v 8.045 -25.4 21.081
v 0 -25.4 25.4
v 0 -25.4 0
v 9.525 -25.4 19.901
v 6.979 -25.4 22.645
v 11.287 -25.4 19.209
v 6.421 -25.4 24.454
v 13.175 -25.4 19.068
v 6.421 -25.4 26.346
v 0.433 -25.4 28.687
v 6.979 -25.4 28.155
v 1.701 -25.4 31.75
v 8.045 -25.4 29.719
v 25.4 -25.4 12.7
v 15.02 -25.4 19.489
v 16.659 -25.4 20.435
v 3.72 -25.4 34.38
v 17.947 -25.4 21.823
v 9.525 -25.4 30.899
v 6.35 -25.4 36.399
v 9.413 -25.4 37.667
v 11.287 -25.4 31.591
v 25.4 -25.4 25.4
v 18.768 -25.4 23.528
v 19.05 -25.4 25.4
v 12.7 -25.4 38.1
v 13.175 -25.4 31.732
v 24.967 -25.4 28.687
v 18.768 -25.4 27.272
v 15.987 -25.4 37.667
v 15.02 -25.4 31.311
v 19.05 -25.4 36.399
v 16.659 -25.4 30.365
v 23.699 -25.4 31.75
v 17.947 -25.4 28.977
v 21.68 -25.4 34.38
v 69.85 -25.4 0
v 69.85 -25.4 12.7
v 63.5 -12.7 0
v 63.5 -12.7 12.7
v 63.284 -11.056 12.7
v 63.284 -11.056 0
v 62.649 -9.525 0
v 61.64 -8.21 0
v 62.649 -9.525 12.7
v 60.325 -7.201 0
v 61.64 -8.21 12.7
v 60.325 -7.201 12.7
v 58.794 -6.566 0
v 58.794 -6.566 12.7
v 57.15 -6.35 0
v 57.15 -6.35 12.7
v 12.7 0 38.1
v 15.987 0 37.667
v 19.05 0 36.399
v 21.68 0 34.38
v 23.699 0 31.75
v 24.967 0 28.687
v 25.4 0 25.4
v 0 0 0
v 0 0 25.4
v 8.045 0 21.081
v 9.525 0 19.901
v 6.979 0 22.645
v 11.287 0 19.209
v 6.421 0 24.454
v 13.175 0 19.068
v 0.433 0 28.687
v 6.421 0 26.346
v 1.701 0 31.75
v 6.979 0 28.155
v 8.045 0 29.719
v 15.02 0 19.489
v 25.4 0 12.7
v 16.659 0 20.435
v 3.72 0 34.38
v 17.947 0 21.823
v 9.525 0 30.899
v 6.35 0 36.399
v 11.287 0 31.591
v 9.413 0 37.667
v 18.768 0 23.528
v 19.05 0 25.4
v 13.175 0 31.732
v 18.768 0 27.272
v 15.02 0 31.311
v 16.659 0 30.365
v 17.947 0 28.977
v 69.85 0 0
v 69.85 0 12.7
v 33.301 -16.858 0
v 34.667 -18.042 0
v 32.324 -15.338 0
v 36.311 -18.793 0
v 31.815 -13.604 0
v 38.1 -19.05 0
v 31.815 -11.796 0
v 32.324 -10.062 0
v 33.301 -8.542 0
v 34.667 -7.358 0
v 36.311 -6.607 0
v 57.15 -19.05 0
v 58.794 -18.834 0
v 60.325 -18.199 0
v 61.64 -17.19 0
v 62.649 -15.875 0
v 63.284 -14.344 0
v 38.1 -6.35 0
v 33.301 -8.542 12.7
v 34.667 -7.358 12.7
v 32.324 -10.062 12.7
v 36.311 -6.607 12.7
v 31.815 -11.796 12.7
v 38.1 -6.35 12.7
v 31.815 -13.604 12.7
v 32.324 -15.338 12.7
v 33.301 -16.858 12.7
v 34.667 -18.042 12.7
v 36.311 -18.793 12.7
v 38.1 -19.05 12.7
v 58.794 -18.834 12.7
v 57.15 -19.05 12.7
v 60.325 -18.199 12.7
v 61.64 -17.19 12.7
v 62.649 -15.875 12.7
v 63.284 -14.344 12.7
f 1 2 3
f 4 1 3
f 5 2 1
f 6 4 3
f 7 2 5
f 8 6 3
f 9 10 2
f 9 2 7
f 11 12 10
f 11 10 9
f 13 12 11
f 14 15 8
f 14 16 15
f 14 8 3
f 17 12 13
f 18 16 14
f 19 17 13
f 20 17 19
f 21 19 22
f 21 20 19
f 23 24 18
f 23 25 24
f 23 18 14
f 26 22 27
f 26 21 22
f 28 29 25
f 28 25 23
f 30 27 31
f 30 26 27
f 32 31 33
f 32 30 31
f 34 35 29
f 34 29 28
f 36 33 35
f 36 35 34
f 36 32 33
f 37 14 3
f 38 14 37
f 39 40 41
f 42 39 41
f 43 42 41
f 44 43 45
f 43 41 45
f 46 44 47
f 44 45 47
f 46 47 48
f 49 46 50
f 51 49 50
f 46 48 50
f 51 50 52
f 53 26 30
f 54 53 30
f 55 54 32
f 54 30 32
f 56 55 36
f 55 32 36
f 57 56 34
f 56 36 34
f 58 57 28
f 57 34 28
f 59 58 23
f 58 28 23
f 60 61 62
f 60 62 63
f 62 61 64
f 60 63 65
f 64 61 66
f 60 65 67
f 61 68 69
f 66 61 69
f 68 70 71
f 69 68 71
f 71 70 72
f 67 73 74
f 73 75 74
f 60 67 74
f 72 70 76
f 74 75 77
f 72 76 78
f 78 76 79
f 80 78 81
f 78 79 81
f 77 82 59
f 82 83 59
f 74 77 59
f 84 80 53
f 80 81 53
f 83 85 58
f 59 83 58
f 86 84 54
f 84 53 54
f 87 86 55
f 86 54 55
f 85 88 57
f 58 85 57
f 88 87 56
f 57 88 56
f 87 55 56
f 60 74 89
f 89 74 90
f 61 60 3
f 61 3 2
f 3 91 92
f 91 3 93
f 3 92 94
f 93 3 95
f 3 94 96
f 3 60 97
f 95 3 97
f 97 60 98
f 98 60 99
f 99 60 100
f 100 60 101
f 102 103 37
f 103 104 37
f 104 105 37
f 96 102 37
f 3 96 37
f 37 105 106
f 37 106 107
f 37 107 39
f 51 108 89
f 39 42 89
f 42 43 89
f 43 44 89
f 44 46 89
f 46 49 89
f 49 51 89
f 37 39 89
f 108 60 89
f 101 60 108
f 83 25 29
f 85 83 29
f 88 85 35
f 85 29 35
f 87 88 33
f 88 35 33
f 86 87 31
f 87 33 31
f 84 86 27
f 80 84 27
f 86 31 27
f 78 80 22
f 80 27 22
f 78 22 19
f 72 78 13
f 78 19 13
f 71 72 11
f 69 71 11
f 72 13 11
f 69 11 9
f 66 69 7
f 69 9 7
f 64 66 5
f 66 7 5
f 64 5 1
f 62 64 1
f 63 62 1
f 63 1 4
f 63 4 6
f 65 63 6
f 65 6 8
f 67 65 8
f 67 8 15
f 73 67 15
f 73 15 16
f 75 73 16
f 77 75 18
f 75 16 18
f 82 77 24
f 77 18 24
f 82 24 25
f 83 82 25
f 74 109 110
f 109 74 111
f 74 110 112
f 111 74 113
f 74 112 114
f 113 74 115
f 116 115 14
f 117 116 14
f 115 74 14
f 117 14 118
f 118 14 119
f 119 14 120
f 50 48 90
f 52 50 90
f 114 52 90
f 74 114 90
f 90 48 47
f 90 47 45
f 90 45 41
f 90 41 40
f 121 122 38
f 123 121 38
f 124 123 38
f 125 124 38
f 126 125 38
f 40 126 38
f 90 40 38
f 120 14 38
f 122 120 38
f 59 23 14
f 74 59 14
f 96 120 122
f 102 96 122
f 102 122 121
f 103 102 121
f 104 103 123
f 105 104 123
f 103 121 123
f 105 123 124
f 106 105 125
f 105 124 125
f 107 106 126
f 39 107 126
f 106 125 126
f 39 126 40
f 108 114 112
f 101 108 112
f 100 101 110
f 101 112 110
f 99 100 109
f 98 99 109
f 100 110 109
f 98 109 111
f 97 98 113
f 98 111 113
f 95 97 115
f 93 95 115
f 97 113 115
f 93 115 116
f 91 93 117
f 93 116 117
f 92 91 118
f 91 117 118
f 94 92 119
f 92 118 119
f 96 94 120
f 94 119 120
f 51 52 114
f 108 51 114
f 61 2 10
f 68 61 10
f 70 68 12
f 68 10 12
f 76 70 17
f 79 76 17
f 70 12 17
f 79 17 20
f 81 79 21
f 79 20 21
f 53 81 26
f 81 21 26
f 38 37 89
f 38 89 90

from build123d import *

# Parameters (mm, degrees)
F0_W     = 69.85
F0_H     = 38.1
F1_DEPTH = 25.4
F2_R     = 6.35
F3_DEPTH = 25.4
F5_DEPTH = 12.7


with BuildPart() as f1:
    # F0 (on Front) → F1 (new body)
    with BuildSketch(Plane.XZ):
        with Locations((34.925, 19.05)):
            Rectangle(F0_W, F0_H)
    extrude(amount=F1_DEPTH)

    # F2 (on face) → F3 (cut)
    with BuildSketch(Plane.XZ.offset(25.4)):
        with Locations((12.7, 25.4)):
            Circle(F2_R)
        with BuildLine():
            ThreePointArc((12.7, 38.1), (21.680256, 34.380256), (25.4, 25.4))
            Line((25.4, 25.4), (25.4, 12.7))
            Line((25.4, 12.7), (69.85, 12.7))
            Line((69.85, 12.7), (69.85, 38.1))
            Line((69.85, 38.1), (12.7, 38.1))
        make_face()
        with BuildLine():
            ThreePointArc((0, 25.4), (3.719744, 34.380256), (12.7, 38.1))
            Line((12.7, 38.1), (0, 38.1))
            Line((0, 38.1), (0, 25.4))
        make_face()
    extrude(amount=-F3_DEPTH, mode=Mode.SUBTRACT)

    # F4 (on face) → F5 (cut)
    with BuildSketch(Plane.XY.offset(12.7)):
        with BuildLine():
            ThreePointArc((57.15, -19.05), (50.8, -12.7), (57.15, -6.35))
            Line((57.15, -6.35), (38.1, -6.35))
            ThreePointArc((38.1, -6.35), (42.590128, -8.209872), (44.45, -12.7))
            ThreePointArc((44.45, -12.7), (42.590128, -17.190128), (38.1, -19.05))
            Line((38.1, -19.05), (57.15, -19.05))
        make_face()
        with BuildLine():
            ThreePointArc((44.45, -12.7), (42.590128, -8.209872), (38.1, -6.35))
            ThreePointArc((38.1, -6.35), (31.75, -12.7), (38.1, -19.05))
            ThreePointArc((38.1, -19.05), (42.590128, -17.190128), (44.45, -12.7))
        make_face()
        with BuildLine():
            ThreePointArc((57.15, -19.05), (61.640128, -17.190128), (63.5, -12.7))
            ThreePointArc((63.5, -12.7), (61.640128, -8.209872), (57.15, -6.35))
            ThreePointArc((57.15, -6.35), (50.8, -12.7), (57.15, -19.05))
        make_face()
    extrude(amount=-F5_DEPTH, mode=Mode.SUBTRACT)


solid = f1.part
